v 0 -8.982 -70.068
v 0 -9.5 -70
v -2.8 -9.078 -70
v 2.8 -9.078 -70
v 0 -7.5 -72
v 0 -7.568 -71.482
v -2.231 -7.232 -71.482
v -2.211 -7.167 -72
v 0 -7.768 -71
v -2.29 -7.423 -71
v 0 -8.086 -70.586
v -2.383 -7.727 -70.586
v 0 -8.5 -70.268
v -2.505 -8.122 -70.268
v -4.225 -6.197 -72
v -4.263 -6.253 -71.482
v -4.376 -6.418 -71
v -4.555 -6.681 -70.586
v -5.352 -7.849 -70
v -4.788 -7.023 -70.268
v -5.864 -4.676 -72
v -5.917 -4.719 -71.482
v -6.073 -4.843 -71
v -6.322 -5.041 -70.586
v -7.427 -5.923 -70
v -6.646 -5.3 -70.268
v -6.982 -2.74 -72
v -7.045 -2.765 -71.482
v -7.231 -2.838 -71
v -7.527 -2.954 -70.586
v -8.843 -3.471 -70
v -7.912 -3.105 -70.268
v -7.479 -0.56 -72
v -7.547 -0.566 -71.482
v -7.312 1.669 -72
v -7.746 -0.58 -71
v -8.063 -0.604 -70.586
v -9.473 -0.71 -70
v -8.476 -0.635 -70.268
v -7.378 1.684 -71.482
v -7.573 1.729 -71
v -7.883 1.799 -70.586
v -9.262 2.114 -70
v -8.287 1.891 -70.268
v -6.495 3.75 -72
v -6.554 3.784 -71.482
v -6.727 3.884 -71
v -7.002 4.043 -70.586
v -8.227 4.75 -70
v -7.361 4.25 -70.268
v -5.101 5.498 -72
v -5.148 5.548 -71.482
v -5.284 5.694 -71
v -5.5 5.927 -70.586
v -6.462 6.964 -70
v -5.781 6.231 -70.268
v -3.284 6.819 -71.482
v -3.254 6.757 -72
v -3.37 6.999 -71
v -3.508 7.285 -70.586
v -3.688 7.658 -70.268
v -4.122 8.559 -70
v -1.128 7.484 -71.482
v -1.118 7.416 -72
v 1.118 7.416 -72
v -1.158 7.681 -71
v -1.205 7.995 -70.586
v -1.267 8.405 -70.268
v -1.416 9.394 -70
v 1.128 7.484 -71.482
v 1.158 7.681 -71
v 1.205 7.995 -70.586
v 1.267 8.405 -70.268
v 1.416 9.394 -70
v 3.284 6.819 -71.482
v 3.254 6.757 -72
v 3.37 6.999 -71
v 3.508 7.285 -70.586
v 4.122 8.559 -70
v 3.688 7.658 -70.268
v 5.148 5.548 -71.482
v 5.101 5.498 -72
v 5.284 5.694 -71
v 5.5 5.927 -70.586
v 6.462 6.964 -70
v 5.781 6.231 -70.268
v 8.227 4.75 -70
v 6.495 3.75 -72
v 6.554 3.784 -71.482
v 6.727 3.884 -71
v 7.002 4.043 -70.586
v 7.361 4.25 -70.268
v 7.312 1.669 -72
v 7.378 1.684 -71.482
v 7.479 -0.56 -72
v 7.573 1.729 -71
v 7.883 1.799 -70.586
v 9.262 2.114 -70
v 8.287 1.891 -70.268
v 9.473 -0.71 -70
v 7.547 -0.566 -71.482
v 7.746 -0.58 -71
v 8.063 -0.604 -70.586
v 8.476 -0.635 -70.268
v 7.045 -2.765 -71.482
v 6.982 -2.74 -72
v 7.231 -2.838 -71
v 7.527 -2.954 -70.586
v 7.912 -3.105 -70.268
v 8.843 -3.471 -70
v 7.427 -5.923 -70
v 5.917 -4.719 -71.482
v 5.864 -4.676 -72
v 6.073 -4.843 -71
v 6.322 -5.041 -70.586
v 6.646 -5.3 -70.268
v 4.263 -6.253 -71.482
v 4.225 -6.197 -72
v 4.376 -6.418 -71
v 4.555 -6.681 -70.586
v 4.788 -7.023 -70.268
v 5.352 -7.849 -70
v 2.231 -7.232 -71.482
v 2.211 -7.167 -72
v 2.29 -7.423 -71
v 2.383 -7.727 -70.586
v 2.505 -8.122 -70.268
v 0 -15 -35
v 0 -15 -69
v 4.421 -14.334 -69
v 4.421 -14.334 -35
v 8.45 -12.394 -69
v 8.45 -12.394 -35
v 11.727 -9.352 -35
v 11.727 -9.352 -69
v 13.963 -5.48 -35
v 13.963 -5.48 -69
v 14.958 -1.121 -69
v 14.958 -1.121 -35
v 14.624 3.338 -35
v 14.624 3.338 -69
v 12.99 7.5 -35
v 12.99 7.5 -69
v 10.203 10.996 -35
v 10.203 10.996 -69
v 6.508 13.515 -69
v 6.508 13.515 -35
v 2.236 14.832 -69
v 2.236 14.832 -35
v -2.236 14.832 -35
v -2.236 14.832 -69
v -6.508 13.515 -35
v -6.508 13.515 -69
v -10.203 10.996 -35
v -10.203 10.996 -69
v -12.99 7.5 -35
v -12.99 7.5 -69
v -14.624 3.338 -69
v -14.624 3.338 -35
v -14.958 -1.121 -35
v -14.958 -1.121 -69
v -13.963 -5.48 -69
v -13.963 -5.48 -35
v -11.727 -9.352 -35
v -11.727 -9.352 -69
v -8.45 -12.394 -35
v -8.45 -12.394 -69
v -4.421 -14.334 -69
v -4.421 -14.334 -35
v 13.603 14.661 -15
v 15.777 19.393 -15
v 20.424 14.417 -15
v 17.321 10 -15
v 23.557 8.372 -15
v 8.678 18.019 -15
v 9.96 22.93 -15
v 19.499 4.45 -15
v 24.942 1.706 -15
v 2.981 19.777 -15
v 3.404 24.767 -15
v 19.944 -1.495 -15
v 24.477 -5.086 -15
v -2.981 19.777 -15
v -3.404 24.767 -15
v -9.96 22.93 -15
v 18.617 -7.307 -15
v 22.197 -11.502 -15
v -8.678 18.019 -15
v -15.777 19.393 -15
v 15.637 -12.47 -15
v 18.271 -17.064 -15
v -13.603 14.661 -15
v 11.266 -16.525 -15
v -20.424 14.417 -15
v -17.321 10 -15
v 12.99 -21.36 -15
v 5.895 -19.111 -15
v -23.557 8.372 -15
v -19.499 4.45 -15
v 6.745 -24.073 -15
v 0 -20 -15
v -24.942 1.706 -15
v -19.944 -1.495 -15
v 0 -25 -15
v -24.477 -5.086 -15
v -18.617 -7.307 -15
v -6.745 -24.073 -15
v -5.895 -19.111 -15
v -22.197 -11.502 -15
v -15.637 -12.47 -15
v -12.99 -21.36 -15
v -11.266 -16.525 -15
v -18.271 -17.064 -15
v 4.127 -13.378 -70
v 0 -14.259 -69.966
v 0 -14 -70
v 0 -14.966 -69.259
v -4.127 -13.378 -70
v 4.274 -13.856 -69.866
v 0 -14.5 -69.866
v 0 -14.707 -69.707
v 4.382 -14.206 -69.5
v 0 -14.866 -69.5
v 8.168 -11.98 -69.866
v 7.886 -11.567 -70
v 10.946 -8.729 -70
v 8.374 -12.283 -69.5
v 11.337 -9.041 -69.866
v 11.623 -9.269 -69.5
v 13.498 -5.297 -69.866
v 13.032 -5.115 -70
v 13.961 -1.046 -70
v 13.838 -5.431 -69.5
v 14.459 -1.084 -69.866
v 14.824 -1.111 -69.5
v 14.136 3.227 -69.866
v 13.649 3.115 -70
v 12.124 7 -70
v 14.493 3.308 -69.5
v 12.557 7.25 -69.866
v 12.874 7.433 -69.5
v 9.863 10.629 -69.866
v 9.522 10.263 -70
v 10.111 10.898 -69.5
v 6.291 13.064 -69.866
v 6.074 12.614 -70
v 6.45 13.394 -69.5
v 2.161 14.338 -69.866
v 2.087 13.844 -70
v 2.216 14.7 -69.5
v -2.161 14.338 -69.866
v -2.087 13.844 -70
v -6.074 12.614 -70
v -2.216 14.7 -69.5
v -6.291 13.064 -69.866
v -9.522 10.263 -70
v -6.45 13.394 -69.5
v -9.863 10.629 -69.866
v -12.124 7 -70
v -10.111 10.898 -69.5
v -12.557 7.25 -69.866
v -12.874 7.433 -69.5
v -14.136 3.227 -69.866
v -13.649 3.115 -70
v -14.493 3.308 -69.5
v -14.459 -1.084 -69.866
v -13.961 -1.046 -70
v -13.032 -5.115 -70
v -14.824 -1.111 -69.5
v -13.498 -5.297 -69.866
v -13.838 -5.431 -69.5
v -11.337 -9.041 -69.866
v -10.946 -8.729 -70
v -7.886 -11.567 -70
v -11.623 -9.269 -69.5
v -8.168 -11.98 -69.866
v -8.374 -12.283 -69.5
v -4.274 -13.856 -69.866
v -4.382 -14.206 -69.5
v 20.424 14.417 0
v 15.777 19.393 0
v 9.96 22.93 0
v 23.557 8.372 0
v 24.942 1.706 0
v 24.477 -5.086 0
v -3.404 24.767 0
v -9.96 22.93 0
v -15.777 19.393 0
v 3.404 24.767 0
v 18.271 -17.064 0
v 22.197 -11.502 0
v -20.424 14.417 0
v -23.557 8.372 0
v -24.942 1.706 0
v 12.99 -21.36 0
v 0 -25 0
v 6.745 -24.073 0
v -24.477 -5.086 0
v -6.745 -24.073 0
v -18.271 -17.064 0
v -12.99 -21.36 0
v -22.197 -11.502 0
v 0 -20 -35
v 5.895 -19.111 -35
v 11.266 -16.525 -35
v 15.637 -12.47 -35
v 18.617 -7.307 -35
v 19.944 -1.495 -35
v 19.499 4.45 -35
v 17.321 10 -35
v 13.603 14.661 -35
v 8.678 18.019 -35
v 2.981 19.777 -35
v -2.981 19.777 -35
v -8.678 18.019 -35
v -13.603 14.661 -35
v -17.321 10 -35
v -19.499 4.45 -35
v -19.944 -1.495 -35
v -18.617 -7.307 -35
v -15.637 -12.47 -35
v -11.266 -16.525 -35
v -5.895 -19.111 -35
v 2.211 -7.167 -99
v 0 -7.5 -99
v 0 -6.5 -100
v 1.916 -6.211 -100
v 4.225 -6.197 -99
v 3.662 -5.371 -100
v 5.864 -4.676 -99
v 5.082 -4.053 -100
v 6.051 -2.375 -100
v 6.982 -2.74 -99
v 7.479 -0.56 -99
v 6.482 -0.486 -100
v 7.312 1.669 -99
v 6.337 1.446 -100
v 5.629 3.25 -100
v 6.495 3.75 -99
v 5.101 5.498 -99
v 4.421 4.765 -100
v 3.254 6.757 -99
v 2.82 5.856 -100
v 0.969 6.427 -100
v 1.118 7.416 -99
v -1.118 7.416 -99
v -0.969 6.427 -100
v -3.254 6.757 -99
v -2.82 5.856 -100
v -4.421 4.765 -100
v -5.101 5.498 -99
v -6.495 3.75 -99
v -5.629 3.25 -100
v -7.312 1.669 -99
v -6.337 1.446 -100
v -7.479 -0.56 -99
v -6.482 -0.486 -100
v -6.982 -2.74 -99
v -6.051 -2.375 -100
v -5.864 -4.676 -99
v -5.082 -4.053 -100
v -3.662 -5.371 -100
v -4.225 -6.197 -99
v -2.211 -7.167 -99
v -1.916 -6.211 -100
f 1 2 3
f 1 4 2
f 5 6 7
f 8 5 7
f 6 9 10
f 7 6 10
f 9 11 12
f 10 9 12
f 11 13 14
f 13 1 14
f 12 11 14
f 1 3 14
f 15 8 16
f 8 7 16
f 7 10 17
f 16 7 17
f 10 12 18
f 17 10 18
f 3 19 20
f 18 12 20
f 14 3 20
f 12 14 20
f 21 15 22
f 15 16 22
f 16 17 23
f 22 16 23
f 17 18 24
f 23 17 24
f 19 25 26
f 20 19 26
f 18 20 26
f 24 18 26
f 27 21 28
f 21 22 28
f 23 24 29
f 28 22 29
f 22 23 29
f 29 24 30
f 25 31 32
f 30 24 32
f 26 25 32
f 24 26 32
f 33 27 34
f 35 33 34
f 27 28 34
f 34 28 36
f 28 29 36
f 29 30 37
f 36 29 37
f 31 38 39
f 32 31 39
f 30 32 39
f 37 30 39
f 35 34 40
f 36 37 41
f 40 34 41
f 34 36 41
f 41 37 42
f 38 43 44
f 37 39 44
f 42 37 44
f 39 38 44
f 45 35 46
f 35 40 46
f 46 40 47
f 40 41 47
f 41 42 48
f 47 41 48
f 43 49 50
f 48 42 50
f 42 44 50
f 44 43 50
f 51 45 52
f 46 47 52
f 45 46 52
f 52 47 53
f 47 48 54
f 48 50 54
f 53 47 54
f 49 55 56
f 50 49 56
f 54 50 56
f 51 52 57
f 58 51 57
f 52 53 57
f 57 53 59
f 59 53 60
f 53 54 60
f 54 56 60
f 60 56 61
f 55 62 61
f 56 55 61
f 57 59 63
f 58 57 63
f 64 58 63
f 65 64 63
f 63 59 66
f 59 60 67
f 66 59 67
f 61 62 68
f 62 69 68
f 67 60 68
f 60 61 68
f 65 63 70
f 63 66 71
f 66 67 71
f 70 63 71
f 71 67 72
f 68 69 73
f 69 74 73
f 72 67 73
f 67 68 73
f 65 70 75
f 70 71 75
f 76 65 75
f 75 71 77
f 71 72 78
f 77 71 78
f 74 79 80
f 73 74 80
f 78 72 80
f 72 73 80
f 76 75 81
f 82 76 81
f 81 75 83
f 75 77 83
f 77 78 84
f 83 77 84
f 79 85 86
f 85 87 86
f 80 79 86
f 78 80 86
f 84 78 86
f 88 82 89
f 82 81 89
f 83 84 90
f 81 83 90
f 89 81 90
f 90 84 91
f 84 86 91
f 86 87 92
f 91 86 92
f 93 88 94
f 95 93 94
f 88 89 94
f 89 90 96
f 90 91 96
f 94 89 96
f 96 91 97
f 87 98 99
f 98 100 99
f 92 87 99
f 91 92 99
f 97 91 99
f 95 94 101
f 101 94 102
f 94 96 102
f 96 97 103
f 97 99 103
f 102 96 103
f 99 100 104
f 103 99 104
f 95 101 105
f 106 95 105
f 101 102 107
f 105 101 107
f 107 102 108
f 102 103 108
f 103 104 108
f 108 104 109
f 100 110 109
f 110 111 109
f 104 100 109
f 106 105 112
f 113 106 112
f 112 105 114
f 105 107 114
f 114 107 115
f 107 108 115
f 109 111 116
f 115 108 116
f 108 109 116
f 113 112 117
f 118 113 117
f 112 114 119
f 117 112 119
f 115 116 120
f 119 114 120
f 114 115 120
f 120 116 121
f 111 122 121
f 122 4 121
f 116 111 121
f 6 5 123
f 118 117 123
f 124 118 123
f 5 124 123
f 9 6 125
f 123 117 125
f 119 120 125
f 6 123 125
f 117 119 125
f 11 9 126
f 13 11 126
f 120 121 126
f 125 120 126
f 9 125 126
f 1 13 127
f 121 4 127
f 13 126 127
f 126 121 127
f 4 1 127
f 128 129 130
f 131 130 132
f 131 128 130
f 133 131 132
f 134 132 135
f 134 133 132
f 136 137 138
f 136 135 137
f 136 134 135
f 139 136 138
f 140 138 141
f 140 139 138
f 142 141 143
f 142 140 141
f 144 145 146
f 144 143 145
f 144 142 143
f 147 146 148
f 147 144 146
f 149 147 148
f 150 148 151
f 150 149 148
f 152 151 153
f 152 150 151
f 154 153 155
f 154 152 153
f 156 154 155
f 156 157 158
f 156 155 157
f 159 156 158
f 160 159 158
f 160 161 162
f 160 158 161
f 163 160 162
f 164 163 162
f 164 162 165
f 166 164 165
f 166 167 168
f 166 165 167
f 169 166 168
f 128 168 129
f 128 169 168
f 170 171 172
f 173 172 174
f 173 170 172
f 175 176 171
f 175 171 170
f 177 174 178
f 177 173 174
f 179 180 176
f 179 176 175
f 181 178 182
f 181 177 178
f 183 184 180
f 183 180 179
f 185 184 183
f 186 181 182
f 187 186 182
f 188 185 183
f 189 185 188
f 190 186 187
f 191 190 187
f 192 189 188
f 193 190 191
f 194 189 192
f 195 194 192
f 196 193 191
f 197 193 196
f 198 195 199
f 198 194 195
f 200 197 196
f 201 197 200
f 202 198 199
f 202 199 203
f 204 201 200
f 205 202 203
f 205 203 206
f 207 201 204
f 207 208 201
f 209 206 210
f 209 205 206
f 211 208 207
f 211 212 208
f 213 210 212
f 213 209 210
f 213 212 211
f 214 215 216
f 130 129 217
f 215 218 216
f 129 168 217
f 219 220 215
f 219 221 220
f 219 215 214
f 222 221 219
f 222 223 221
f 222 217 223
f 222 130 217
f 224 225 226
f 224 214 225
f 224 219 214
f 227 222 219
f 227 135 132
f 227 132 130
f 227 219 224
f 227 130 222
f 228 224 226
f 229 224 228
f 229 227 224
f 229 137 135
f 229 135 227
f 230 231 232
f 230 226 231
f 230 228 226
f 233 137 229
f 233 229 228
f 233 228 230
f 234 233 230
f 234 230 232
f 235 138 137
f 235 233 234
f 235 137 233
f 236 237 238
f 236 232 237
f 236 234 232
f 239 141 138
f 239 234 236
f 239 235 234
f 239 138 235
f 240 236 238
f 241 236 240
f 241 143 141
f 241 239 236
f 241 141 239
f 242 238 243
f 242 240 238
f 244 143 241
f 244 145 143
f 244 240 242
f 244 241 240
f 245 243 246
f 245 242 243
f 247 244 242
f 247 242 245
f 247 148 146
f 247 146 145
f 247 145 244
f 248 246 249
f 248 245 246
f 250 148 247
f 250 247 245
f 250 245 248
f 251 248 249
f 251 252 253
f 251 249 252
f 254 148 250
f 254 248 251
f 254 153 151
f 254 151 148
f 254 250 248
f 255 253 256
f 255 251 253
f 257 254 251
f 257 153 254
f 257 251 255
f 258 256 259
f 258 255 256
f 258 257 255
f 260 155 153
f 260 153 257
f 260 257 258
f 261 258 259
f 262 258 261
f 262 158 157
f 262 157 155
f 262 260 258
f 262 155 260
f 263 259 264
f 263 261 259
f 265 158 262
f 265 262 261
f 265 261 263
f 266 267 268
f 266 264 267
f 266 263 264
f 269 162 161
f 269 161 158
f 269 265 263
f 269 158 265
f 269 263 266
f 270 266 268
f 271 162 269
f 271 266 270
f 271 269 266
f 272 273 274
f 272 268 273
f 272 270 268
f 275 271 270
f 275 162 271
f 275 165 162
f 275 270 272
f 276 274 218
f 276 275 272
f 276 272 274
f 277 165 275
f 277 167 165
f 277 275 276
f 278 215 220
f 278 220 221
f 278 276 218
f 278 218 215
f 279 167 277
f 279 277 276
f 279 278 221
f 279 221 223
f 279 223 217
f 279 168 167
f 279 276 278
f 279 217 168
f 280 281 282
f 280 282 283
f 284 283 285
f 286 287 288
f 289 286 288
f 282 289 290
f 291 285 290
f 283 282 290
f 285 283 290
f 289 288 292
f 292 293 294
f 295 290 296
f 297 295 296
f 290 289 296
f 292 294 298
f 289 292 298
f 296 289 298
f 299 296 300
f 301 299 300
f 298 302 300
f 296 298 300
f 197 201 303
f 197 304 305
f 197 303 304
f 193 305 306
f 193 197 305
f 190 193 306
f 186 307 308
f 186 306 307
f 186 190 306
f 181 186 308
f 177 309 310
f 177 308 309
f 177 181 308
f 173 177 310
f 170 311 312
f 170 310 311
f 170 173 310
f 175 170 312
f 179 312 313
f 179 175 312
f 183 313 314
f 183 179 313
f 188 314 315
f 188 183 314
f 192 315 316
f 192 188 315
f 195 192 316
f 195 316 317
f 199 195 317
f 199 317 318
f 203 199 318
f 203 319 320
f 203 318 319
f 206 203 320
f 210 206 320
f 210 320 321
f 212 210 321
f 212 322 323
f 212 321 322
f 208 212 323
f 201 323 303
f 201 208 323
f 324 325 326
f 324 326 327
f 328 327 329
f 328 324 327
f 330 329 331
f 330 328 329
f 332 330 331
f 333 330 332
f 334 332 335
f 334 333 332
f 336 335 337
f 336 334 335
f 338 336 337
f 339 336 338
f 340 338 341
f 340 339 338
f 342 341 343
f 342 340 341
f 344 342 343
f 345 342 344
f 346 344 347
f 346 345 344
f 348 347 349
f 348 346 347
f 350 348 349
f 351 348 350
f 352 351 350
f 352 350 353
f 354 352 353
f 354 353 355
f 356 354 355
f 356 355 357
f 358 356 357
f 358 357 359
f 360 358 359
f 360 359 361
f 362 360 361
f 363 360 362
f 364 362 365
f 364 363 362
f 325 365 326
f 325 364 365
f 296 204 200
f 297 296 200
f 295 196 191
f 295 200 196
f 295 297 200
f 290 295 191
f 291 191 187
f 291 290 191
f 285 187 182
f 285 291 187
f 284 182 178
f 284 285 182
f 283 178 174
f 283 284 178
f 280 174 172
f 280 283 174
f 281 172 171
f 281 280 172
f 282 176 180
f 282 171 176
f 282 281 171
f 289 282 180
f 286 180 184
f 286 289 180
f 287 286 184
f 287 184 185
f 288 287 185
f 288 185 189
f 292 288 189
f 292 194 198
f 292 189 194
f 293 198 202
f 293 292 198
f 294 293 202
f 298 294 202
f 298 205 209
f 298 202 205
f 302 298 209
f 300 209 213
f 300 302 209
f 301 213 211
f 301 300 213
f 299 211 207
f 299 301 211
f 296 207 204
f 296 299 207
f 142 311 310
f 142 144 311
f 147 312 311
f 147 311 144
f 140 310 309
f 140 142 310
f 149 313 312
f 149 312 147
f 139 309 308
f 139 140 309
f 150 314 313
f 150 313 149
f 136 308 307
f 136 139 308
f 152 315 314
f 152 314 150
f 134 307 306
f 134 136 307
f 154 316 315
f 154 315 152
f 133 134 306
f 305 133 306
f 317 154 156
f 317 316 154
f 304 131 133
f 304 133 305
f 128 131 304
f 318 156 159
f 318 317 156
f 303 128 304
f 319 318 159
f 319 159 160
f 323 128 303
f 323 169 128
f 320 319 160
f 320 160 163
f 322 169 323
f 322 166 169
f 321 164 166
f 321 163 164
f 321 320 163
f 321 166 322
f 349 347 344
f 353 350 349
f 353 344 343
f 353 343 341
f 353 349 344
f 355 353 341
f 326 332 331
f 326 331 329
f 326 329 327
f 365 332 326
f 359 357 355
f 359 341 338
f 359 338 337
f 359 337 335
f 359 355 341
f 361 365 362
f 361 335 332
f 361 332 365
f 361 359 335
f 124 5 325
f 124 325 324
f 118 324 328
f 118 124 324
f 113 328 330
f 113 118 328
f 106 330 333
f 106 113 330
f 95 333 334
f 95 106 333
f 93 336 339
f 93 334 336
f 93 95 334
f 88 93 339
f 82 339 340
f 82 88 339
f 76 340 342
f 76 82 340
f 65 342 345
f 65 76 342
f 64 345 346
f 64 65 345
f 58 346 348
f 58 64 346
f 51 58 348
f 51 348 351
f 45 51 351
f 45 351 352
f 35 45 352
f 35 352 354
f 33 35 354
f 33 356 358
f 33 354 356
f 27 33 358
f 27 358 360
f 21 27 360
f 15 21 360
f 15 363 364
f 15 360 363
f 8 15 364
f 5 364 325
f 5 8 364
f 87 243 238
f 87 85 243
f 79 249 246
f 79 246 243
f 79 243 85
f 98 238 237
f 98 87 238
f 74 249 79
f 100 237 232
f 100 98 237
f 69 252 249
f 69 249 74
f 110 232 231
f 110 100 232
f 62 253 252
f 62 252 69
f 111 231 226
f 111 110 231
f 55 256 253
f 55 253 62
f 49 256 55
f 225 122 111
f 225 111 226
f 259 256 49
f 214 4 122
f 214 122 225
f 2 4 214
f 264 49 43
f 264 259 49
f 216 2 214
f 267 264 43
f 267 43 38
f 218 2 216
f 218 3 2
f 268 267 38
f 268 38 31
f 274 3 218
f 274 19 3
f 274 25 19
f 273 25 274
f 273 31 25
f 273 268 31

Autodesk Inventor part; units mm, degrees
ref_plane "YZ Plane" through (0, 0, 0) normal (1, 0, 0) x (0, 1, 0)
ref_plane "XZ Plane" through (0, 0, 0) normal (0, 1, 0) x (-1, 0, 0)
ref_plane "XY Plane" through (0, 0, 0) normal (0, 0, 1) x (1, 0, 0)
sketch "Sketch1" plane through (0, 0, 0) normal (1, 0, 0) x (0, 1, 0)
  line L0 (0, 0) -> (0, -100)
  line L1 (0, -100) -> (7.5, -100)
  line L2 (7.5, -100) -> (7.5, -70)
  line L3 (7.5, -70) -> (15, -70)
  line L4 (15, -70) -> (15, -35)
  line L5 (15, -35) -> (20, -35)
  line L6 (20, -35) -> (20, -15)
  line L7 (20, -15) -> (25, -15)
  line L8 (25, -15) -> (25, 0)
  line L9 (25, 0) -> (0, 0)
  dimension "d0" = 100
  dimension "d1" = 15
  dimension "d2" = 20
  dimension "d3" = 35
  dimension "d4" = 15
  dimension "d5" = 30
  dimension "d6" = 40
  dimension "d7" = 50
revolve "Revolution1" add sketch "Sketch1" angle 360 mid plane about axis through (0, 0, 0) along (0, 0, -1)
chamfer "Chamfer1" distance 1 angle 45 1 edges at (0, 7.5, -100)
fillet "Fillet1" radius 2 1 edges at (0, 7.5, -70)
fillet "Fillet2" radius 1 1 edges at (0, 15, -70)
thread "Thread1" size "M15x1.5" class "6g" standard "ANSI Metric M Profile" full length
